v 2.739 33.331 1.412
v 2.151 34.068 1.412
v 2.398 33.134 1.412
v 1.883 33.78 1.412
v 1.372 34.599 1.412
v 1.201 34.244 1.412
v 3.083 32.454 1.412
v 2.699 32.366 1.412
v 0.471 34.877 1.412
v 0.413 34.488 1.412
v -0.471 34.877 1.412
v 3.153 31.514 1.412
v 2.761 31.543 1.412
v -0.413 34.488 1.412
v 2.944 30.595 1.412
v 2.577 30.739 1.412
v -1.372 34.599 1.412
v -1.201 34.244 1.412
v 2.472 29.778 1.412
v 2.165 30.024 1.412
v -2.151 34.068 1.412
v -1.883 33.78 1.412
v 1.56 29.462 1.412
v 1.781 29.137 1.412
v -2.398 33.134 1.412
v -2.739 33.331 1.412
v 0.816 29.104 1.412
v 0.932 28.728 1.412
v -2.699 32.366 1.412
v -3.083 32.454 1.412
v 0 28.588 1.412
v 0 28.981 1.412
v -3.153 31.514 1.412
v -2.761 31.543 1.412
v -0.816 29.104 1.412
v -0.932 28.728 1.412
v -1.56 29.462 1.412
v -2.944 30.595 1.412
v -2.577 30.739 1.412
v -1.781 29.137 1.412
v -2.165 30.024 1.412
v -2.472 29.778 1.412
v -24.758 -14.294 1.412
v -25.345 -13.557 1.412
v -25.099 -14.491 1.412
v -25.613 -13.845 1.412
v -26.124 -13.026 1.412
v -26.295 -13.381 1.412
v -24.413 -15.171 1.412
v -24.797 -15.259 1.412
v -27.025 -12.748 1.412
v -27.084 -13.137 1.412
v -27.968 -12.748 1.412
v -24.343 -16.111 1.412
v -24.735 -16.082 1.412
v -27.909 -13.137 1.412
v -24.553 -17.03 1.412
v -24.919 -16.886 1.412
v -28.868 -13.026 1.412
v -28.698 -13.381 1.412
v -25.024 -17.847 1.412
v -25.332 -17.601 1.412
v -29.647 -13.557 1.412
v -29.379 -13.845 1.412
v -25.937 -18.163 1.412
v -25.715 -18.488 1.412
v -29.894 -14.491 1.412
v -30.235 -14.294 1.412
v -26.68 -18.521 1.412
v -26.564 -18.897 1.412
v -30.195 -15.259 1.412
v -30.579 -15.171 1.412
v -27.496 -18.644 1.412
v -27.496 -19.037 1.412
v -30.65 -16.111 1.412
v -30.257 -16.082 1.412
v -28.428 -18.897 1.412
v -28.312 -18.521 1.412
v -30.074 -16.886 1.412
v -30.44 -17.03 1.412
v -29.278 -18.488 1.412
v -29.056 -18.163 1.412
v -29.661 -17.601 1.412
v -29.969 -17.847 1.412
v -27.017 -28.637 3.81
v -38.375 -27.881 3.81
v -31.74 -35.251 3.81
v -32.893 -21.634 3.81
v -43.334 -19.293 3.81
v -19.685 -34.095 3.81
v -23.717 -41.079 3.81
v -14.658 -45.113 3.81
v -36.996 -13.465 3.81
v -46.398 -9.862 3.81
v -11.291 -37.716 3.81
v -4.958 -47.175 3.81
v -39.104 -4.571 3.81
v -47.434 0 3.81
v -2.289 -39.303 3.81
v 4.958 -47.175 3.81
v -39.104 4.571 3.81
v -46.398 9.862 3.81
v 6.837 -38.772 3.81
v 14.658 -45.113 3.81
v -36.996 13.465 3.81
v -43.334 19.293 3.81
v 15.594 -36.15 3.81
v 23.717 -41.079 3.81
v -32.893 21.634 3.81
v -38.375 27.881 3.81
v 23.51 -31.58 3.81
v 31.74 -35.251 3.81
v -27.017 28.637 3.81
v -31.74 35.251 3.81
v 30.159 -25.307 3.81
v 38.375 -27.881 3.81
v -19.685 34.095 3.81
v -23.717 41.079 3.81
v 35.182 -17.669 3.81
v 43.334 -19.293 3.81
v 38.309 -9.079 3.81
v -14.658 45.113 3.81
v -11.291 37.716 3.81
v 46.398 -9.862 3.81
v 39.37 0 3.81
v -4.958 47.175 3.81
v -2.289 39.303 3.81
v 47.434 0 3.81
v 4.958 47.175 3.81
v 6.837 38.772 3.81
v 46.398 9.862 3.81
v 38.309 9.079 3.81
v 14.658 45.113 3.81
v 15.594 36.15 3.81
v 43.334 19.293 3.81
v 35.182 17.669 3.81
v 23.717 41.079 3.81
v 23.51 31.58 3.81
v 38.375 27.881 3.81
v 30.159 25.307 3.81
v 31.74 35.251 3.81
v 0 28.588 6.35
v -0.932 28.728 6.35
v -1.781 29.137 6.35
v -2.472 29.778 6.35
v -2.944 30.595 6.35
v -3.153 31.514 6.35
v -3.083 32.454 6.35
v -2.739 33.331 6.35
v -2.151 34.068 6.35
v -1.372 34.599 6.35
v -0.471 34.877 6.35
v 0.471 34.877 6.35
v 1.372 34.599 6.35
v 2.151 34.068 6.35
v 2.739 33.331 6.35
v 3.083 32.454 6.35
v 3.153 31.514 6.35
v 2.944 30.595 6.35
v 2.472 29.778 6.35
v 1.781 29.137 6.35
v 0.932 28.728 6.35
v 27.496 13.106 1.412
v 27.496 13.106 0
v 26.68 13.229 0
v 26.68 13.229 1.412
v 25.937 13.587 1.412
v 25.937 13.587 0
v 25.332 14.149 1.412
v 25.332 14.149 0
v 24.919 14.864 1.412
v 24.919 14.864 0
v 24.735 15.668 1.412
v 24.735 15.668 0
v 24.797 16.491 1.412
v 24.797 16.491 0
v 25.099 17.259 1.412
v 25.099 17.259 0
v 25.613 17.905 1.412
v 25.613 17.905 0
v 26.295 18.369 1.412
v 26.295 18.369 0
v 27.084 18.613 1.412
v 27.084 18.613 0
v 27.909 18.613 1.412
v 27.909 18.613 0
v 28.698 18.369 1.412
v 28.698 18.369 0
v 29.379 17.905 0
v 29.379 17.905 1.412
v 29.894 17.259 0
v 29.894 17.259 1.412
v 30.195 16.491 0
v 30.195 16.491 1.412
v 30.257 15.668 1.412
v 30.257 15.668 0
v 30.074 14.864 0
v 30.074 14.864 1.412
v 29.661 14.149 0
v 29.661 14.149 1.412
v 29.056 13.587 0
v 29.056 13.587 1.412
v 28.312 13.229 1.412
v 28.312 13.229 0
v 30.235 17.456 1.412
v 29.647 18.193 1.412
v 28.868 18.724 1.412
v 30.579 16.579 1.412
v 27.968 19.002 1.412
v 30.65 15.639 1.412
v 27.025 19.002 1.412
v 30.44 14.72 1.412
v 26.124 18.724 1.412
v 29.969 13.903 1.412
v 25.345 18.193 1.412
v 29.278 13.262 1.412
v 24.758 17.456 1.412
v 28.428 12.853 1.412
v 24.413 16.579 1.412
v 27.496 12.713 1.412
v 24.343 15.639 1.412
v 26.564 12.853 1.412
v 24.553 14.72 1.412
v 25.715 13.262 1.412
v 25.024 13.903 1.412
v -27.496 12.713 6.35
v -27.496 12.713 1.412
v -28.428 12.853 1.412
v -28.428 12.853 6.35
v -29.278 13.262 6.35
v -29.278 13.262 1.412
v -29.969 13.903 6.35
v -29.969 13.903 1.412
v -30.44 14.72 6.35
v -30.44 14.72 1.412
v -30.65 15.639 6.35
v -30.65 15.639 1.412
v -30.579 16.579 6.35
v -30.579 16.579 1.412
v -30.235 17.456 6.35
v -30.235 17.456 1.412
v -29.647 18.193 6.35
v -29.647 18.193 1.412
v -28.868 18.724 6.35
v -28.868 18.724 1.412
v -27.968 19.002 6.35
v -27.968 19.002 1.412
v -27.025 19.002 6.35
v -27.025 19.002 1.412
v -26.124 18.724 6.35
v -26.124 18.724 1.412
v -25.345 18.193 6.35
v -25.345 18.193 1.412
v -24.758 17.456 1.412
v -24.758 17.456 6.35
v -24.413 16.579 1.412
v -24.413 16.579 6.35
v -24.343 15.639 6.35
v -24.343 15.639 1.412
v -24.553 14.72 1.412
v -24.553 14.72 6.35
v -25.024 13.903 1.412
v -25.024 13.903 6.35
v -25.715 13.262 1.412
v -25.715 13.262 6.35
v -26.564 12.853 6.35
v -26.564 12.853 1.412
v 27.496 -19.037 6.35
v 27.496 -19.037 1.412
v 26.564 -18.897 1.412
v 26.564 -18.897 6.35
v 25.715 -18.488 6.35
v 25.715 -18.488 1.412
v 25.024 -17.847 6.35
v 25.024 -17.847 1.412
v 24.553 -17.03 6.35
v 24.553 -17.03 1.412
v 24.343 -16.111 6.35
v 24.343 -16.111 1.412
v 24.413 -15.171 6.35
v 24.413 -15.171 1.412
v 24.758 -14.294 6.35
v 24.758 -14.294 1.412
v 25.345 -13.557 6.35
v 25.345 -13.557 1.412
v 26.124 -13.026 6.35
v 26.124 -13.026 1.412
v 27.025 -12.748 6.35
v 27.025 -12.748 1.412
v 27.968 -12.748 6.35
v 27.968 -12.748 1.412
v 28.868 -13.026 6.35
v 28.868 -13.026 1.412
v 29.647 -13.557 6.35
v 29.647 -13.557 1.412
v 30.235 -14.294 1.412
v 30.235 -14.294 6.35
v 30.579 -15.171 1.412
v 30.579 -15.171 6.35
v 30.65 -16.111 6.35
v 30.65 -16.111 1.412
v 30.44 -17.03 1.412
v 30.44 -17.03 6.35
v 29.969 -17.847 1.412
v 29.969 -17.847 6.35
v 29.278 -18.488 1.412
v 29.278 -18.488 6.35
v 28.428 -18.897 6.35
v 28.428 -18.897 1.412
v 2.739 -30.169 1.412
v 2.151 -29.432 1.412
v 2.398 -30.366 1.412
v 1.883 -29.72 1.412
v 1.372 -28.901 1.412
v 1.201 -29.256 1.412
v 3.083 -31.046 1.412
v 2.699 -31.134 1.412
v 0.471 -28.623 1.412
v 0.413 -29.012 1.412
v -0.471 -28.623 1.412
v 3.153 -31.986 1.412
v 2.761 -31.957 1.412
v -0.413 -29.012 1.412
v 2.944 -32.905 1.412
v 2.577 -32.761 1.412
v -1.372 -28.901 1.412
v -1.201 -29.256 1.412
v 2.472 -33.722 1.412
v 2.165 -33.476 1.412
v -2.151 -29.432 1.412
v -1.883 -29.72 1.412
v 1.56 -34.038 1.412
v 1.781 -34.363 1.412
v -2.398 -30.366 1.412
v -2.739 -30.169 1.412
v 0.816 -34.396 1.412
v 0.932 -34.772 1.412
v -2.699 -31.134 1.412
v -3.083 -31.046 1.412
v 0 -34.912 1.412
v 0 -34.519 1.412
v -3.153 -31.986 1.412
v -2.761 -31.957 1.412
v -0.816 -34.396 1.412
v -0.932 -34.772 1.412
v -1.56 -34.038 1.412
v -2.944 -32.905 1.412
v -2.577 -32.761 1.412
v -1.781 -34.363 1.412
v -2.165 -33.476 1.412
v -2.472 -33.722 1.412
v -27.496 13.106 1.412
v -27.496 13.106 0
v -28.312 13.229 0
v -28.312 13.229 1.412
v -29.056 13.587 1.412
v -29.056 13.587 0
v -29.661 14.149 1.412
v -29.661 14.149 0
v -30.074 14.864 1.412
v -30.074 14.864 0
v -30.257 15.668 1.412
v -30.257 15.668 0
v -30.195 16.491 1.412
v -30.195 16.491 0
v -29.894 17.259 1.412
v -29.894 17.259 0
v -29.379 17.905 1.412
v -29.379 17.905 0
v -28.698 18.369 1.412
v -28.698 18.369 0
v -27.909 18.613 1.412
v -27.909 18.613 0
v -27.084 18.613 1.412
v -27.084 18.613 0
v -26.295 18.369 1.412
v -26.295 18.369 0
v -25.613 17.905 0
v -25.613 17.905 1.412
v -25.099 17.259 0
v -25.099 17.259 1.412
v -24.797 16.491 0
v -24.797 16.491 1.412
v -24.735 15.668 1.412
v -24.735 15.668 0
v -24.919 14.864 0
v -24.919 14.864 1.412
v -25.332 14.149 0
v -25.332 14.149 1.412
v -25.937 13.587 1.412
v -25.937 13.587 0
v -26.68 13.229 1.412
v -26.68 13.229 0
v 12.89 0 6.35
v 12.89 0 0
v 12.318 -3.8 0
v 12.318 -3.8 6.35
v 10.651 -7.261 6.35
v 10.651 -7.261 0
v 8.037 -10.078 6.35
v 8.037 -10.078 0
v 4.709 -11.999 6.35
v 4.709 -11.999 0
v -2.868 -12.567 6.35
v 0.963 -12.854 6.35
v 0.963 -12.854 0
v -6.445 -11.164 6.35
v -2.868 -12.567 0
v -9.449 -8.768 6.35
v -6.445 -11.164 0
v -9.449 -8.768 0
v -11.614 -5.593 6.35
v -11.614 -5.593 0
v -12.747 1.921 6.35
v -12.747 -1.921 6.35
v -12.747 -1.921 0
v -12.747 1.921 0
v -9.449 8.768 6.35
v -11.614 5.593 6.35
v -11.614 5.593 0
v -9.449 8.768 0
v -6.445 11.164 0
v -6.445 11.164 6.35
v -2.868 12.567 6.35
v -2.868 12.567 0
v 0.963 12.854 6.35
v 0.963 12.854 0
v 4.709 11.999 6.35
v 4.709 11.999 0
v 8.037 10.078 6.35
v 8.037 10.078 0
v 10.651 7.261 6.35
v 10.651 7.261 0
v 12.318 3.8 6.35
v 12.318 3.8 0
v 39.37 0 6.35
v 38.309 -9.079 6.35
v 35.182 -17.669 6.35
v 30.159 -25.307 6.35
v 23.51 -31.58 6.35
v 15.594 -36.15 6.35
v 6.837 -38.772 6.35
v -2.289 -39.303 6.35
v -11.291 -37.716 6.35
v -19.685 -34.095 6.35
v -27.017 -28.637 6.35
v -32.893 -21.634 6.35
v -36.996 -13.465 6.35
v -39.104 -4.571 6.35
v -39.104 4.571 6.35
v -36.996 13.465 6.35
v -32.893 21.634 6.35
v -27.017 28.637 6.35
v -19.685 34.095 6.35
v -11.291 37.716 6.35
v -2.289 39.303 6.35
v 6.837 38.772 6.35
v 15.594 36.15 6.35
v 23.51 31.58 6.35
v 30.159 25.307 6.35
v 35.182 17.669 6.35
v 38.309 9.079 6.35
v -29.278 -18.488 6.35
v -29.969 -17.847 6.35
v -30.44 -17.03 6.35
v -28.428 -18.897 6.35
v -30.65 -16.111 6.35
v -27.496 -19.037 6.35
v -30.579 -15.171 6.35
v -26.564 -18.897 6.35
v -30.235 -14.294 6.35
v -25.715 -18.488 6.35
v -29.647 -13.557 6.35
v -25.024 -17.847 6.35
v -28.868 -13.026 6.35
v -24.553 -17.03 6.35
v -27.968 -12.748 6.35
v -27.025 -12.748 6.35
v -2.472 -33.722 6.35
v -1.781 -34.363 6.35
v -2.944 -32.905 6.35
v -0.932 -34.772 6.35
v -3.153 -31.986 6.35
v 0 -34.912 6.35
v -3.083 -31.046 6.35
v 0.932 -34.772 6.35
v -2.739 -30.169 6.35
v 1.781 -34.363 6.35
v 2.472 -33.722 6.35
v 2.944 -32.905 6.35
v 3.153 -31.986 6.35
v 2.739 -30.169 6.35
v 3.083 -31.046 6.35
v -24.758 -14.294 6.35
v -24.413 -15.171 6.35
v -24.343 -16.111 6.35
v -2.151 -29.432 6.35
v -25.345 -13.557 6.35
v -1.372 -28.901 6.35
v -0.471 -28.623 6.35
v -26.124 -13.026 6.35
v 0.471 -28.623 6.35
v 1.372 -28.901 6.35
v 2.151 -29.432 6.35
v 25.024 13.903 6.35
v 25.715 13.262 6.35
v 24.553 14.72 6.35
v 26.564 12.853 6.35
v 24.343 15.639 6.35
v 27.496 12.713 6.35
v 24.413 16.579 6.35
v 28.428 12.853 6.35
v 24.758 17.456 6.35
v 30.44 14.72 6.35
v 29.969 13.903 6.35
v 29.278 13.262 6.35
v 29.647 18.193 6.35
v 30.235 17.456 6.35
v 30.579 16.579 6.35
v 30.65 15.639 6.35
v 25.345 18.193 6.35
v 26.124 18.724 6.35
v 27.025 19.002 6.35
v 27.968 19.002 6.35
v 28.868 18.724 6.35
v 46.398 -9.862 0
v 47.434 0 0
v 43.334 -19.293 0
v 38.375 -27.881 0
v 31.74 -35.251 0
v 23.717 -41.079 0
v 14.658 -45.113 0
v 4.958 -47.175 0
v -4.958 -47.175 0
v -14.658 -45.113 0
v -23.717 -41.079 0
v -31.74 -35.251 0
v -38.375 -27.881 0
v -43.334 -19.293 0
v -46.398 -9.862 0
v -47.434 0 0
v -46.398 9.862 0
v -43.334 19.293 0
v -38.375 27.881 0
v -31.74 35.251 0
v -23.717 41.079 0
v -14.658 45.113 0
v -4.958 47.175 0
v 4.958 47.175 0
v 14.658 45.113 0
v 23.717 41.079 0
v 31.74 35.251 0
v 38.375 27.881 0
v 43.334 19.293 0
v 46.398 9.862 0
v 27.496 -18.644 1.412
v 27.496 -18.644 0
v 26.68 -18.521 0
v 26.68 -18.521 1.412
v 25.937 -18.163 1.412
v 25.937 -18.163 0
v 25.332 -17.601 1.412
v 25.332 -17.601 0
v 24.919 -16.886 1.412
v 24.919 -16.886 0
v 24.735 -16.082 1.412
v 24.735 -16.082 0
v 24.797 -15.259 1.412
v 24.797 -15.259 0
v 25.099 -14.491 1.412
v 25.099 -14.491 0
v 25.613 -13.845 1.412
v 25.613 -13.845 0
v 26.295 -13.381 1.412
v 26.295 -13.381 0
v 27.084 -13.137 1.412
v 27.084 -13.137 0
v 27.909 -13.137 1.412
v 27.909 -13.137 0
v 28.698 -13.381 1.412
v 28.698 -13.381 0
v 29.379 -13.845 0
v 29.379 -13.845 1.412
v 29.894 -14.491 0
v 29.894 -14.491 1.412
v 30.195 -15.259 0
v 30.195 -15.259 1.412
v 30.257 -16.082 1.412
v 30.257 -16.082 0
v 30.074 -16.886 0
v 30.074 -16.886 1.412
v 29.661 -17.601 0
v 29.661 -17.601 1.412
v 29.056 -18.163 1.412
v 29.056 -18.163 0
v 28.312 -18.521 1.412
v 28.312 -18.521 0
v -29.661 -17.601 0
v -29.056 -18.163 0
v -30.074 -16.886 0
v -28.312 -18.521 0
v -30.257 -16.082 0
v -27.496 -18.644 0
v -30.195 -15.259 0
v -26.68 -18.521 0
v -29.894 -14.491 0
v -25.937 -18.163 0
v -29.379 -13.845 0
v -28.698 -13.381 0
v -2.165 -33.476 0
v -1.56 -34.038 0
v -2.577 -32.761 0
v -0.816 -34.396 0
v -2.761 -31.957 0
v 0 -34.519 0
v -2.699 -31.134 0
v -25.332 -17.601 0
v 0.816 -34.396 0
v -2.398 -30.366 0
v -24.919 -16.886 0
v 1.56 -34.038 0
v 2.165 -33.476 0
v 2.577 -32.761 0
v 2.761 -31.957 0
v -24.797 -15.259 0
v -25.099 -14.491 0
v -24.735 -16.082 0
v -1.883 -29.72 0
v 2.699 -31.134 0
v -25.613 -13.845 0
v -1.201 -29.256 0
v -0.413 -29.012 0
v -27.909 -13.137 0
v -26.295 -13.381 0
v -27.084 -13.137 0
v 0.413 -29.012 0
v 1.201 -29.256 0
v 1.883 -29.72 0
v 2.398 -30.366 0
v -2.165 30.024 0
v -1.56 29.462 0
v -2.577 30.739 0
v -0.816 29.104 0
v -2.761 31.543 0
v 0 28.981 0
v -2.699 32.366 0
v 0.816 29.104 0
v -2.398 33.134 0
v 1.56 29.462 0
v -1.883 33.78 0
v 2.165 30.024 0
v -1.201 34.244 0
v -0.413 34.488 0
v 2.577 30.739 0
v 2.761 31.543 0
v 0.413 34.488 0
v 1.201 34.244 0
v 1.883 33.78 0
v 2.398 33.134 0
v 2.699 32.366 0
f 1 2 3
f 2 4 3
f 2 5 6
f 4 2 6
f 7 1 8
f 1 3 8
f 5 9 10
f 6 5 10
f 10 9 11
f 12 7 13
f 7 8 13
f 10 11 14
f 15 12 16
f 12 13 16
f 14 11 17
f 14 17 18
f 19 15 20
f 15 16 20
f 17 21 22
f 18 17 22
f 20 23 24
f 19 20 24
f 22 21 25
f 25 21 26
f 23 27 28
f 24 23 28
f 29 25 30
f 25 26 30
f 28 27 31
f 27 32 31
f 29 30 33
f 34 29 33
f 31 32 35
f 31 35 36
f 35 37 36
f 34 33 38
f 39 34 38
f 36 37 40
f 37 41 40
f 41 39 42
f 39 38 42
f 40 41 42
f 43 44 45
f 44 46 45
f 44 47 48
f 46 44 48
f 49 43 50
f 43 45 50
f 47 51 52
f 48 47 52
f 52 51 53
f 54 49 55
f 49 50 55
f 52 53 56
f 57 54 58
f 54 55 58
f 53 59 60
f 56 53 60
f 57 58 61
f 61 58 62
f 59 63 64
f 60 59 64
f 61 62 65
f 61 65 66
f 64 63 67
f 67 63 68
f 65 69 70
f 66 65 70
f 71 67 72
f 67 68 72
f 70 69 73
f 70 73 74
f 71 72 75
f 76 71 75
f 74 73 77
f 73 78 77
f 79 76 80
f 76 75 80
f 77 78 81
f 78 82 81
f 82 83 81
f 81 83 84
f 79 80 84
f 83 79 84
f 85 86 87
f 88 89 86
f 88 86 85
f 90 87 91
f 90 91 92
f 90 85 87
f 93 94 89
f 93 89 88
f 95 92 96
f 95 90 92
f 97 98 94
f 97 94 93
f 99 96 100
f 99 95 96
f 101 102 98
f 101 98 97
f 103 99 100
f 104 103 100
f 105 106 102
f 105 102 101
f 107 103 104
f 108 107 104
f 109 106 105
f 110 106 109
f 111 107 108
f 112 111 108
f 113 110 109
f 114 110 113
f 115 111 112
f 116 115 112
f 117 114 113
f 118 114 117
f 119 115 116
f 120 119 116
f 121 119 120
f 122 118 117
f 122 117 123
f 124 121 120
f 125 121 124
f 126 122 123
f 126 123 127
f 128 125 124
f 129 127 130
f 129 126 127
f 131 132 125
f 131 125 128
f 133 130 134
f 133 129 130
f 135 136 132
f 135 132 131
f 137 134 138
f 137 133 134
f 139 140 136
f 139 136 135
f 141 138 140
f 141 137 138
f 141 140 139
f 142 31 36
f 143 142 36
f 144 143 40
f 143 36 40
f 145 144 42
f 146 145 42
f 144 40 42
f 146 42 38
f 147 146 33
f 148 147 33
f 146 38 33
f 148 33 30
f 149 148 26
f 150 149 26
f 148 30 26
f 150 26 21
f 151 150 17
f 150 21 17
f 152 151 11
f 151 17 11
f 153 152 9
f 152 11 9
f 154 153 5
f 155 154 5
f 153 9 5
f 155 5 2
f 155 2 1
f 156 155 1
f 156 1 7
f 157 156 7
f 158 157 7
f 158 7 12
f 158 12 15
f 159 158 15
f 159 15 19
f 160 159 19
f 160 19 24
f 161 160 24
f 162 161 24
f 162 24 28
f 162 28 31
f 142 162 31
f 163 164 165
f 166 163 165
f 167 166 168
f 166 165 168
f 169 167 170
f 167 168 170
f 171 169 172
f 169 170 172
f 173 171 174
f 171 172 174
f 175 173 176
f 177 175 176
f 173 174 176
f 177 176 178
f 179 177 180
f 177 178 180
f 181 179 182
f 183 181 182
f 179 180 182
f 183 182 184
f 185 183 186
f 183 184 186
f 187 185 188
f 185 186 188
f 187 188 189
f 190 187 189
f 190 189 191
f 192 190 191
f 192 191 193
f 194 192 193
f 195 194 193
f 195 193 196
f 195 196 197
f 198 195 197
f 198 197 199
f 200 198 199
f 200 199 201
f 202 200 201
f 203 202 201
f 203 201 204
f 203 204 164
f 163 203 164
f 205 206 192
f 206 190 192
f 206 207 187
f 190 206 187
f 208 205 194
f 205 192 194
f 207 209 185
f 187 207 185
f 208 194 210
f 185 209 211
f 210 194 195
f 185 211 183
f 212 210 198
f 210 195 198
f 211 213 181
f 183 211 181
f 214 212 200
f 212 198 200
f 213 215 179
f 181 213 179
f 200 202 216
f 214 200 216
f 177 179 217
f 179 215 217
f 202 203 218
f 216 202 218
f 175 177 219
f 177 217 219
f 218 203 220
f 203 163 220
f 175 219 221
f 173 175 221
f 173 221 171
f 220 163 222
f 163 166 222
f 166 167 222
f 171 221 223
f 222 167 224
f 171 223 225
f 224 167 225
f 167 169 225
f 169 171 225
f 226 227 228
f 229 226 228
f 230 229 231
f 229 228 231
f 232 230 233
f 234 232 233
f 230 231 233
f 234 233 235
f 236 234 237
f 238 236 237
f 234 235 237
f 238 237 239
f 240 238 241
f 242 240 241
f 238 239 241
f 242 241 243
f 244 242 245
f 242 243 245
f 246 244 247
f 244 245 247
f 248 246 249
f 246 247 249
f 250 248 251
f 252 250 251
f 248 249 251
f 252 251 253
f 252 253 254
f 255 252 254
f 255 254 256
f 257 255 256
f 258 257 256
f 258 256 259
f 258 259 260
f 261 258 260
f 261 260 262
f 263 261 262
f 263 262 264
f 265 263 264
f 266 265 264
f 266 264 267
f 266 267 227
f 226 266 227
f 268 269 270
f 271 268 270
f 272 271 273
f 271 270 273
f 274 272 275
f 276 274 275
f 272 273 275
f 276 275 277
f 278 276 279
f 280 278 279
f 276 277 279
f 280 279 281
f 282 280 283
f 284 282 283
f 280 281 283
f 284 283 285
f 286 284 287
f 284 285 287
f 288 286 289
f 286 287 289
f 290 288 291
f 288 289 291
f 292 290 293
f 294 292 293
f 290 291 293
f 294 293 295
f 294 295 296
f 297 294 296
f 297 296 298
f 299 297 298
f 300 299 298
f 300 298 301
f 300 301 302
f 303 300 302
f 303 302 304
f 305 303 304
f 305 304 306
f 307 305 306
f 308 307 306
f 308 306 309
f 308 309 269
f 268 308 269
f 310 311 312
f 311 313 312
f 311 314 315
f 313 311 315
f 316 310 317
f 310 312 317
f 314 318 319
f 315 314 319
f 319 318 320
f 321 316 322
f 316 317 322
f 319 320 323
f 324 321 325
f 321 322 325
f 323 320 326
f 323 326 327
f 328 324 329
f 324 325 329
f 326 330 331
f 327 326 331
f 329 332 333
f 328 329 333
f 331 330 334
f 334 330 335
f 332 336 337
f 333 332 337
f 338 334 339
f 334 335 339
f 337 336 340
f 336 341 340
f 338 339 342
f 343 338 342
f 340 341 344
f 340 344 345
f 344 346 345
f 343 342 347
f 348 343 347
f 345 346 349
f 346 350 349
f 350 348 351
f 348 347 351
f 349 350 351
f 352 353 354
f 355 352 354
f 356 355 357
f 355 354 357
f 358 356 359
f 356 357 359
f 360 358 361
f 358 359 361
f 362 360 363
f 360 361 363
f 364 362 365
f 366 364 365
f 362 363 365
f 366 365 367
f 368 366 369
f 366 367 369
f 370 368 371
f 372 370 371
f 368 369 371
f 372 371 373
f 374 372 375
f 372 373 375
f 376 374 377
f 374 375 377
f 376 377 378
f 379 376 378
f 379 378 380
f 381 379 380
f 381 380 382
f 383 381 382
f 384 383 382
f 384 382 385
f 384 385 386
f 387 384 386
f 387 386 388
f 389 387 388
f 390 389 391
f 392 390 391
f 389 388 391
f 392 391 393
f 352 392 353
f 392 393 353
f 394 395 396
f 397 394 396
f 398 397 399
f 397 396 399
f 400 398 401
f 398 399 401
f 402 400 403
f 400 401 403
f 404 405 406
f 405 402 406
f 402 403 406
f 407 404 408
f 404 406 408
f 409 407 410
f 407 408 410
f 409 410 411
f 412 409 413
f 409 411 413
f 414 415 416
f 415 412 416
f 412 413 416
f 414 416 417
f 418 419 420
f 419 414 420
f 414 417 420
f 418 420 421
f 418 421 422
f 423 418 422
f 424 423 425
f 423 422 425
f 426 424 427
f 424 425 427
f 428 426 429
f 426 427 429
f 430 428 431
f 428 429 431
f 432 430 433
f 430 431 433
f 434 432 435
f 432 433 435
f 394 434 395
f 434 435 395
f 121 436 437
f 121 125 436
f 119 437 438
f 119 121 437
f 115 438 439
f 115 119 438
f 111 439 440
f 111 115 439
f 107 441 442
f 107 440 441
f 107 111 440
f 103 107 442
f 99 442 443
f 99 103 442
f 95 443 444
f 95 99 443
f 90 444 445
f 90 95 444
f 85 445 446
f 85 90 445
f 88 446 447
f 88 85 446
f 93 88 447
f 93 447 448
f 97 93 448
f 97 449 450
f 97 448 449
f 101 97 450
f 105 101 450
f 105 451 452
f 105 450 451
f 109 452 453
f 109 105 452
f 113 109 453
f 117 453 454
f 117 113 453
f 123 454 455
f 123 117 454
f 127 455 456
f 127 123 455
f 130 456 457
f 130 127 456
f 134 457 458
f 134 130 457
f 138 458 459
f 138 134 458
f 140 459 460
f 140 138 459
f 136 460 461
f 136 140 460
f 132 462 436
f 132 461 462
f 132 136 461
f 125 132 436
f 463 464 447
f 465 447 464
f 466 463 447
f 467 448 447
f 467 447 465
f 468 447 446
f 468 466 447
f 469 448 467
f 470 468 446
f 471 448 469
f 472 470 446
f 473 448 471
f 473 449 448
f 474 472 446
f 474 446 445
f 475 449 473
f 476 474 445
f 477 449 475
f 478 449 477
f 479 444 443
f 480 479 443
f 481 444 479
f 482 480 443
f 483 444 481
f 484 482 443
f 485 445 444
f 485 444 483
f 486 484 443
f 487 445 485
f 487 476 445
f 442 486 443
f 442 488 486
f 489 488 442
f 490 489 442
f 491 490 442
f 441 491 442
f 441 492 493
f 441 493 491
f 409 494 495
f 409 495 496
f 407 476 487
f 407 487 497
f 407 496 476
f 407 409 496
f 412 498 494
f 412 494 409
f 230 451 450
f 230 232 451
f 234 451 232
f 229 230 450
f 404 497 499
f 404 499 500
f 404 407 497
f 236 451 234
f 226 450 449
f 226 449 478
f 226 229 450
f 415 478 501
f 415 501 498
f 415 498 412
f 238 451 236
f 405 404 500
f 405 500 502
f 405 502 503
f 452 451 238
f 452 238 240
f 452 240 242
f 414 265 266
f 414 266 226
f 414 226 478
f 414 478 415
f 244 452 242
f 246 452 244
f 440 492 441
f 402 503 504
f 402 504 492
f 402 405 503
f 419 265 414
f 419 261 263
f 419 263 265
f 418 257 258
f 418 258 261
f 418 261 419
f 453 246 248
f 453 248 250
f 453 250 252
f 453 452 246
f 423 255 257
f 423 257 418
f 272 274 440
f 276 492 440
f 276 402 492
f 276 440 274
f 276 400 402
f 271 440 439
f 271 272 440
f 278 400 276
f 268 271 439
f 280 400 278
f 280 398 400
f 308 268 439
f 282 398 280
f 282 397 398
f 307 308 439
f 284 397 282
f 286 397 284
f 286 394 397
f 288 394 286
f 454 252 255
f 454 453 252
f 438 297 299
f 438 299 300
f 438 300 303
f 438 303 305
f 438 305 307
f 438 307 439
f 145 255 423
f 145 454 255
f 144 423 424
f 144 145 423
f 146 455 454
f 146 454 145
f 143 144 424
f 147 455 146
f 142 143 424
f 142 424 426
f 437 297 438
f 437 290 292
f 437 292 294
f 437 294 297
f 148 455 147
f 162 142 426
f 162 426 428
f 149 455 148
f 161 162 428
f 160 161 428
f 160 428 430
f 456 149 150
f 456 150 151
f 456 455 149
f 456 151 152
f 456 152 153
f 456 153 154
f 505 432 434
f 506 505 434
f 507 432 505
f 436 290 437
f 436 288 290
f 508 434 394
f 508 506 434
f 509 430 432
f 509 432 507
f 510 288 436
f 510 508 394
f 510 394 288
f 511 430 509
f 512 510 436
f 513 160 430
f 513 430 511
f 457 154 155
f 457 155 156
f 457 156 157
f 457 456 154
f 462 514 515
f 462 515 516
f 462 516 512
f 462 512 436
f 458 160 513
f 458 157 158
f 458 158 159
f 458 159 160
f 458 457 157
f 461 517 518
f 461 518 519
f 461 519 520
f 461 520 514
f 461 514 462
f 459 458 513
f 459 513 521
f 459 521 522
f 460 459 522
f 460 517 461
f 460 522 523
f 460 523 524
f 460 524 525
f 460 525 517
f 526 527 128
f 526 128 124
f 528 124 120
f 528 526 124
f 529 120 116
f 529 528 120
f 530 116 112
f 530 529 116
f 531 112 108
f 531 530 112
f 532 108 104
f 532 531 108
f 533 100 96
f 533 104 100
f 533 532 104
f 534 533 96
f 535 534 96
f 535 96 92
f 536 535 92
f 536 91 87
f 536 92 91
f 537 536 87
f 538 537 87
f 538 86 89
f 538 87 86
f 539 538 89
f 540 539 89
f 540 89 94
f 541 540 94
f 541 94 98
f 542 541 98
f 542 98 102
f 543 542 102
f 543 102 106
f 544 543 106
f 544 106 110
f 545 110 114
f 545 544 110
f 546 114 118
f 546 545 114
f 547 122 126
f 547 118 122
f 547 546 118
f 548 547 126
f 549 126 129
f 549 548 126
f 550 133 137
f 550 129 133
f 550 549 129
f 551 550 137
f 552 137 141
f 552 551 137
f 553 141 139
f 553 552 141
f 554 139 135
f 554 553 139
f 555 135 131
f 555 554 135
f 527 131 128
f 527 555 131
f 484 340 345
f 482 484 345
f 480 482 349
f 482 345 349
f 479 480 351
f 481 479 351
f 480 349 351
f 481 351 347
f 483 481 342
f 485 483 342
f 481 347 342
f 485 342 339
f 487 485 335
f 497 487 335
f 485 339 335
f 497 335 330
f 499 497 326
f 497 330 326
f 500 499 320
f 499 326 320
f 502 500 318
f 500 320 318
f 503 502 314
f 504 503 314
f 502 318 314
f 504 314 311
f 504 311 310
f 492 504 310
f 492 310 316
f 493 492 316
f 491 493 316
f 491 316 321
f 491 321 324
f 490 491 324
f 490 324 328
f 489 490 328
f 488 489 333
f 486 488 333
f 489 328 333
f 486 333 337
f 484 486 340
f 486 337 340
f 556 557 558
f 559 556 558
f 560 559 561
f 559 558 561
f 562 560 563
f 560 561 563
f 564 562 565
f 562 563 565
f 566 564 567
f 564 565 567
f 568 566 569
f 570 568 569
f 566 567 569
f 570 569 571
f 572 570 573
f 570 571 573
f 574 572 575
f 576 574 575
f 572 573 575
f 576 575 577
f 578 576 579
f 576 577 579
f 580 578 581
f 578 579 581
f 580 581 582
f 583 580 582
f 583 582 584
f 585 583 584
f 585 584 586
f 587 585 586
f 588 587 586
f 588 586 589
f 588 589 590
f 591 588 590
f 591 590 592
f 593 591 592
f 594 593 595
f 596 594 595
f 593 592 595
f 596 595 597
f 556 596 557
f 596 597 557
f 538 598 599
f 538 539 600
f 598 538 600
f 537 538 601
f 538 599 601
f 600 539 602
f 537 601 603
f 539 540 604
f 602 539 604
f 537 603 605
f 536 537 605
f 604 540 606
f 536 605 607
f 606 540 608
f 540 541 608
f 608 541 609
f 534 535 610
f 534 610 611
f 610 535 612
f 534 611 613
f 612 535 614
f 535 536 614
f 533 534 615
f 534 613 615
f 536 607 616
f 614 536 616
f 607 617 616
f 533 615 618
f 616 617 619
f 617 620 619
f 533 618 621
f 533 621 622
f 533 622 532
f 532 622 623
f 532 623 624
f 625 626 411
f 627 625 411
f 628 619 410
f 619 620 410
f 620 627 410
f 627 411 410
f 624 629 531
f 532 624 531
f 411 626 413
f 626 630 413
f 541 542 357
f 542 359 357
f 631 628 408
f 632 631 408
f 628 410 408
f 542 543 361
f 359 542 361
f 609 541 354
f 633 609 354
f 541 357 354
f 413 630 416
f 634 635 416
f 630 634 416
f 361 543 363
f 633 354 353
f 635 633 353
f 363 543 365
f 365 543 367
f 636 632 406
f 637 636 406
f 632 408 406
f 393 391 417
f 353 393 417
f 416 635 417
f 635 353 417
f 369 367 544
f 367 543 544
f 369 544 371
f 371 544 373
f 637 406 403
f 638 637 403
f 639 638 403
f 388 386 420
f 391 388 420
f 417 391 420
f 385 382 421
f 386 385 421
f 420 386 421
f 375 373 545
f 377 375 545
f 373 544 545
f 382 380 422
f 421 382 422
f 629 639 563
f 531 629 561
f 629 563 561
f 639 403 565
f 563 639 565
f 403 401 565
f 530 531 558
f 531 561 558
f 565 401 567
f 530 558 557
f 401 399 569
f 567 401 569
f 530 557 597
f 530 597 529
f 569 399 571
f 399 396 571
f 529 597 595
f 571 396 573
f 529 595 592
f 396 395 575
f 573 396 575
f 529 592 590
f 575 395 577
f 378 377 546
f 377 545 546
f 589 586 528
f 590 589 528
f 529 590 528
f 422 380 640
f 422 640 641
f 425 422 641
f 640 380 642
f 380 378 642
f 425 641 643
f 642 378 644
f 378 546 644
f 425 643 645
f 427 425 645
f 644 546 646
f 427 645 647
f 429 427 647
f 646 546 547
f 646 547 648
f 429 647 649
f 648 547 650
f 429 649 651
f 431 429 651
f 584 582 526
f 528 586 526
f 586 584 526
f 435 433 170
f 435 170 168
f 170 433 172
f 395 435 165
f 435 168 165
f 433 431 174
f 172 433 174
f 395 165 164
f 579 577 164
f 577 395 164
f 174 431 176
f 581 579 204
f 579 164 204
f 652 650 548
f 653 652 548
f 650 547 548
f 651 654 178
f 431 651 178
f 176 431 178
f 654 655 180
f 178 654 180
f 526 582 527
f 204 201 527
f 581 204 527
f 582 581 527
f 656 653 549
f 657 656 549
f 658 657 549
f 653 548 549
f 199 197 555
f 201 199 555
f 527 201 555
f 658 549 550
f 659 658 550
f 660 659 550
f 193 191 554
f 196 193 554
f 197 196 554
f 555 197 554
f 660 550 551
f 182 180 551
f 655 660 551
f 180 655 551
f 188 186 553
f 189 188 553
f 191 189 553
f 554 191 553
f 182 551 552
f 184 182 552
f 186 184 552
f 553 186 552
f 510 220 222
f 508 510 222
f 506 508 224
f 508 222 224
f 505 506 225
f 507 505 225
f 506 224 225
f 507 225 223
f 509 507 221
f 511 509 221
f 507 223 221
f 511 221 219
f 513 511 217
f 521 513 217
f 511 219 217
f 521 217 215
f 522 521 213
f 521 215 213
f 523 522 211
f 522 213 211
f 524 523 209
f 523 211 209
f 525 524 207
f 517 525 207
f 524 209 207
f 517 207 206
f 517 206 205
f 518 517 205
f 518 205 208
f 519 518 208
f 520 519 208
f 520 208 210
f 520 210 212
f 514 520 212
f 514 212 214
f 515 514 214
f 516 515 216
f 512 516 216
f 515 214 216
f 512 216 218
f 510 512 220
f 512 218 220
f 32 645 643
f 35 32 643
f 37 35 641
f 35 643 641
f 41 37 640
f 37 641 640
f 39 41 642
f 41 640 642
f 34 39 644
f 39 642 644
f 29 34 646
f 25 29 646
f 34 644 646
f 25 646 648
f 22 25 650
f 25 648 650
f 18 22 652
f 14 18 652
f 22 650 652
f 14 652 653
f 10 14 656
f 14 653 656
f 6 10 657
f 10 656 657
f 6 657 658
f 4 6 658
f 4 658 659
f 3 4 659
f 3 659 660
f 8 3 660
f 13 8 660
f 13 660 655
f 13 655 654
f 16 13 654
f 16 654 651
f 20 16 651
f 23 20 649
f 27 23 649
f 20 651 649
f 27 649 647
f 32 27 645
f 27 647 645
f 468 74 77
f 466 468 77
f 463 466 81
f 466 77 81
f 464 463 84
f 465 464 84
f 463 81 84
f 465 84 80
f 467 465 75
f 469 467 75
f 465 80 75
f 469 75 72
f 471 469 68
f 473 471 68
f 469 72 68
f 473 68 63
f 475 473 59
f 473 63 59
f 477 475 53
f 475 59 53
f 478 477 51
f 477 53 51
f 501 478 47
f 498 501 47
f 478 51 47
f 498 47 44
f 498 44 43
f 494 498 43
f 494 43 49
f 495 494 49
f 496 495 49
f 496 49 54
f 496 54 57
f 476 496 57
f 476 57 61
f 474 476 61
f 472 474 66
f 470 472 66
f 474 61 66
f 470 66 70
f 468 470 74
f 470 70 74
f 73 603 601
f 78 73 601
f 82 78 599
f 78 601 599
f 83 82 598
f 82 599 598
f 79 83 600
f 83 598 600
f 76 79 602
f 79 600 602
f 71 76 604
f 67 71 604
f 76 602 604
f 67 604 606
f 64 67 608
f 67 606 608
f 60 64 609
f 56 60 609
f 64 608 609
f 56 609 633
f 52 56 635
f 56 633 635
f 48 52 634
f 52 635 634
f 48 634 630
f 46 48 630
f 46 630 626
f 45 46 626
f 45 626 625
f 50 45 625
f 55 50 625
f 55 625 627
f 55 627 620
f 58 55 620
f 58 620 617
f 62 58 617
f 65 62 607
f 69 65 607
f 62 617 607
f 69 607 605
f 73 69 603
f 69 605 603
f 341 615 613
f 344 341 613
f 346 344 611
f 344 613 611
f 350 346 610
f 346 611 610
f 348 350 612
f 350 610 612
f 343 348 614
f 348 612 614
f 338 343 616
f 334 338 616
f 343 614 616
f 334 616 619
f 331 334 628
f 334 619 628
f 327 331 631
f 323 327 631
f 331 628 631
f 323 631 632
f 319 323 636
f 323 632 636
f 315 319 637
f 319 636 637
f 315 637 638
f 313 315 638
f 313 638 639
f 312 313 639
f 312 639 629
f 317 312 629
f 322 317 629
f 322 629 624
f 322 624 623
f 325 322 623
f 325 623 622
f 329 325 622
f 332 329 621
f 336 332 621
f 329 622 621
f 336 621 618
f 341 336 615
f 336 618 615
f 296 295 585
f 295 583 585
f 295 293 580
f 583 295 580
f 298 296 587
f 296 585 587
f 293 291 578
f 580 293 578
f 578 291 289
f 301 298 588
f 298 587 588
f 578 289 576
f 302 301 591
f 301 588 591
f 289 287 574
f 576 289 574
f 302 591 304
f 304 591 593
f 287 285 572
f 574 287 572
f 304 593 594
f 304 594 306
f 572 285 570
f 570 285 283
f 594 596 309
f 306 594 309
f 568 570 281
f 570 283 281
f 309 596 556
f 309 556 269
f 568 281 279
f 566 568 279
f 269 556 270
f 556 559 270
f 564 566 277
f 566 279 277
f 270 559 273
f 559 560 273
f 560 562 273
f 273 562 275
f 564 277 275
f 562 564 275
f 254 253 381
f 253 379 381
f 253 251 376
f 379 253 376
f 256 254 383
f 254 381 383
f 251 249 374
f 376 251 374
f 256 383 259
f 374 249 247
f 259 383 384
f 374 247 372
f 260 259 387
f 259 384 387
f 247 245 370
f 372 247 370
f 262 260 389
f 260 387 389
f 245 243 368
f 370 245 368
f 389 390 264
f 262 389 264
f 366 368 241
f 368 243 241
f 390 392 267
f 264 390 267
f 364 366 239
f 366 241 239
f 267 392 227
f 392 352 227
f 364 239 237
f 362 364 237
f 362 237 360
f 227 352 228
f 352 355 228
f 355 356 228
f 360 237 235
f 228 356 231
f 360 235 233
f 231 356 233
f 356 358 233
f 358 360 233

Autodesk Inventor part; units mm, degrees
ref_plane "YZ Plane" through (0, 0, 0) normal (1, 0, 0) x (0, 1, 0)
ref_plane "XZ Plane" through (0, 0, 0) normal (0, 1, 0) x (-1, 0, 0)
ref_plane "XY Plane" through (0, 0, 0) normal (0, 0, 1) x (1, 0, 0)
sketch "Sketch1" plane through (0, 0, 0) normal (0, 0, 1) x (1, 0, 0)
  circle A0 centre (0, 0) radius 12.8905
  circle A1 centre (0, 0) radius 47.4345
  dimension "d0" = 25.781
  dimension "d1" = 94.869
extrude "Extrusion1" add sketch "Sketch1" along normal blind 3.81
sketch "Sketch2" plane through (0, 0, 3.81) normal (0, 0, 1) x (1, 0, 0)
  circle A0 centre (0, 0) radius 12.8905
  circle A1 centre (0, 0) radius 39.37
  dimension "d4" = 78.74
extrude "Extrusion2" add sketch "Sketch2" along normal blind 2.54
sketch "Sketch4" plane through (0, 0, 6.35) normal (0, 0, 1) x (1, 0, 0)
  point P0 (0, 0)
  point P1 (0, 31.75)
  point P2 (-27.4963, 15.875)
  point P3 (-27.4963, -15.875)
  point P4 (0, -31.75)
  point P5 (27.4963, -15.875)
  point P6 (27.4963, 15.875)
  dimension "d19" = 31.75
  dimension "d22" = 360
hole "Hole2" at (0, 31.75, 6.35) at (-27.4963, 15.875, 6.35) at (-27.4963, -15.875, 6.35) at (0, -31.75, 6.35) at (27.4963, -15.875, 6.35) at (27.4963, 15.875, 6.35) direction (0, 0, -1) diameter 5.5372 depth 6.35 tip angle 118 counterbore diameter 6.3246 counterbore depth 4.9378
properties part number "Worm Gear5-Bottom"
